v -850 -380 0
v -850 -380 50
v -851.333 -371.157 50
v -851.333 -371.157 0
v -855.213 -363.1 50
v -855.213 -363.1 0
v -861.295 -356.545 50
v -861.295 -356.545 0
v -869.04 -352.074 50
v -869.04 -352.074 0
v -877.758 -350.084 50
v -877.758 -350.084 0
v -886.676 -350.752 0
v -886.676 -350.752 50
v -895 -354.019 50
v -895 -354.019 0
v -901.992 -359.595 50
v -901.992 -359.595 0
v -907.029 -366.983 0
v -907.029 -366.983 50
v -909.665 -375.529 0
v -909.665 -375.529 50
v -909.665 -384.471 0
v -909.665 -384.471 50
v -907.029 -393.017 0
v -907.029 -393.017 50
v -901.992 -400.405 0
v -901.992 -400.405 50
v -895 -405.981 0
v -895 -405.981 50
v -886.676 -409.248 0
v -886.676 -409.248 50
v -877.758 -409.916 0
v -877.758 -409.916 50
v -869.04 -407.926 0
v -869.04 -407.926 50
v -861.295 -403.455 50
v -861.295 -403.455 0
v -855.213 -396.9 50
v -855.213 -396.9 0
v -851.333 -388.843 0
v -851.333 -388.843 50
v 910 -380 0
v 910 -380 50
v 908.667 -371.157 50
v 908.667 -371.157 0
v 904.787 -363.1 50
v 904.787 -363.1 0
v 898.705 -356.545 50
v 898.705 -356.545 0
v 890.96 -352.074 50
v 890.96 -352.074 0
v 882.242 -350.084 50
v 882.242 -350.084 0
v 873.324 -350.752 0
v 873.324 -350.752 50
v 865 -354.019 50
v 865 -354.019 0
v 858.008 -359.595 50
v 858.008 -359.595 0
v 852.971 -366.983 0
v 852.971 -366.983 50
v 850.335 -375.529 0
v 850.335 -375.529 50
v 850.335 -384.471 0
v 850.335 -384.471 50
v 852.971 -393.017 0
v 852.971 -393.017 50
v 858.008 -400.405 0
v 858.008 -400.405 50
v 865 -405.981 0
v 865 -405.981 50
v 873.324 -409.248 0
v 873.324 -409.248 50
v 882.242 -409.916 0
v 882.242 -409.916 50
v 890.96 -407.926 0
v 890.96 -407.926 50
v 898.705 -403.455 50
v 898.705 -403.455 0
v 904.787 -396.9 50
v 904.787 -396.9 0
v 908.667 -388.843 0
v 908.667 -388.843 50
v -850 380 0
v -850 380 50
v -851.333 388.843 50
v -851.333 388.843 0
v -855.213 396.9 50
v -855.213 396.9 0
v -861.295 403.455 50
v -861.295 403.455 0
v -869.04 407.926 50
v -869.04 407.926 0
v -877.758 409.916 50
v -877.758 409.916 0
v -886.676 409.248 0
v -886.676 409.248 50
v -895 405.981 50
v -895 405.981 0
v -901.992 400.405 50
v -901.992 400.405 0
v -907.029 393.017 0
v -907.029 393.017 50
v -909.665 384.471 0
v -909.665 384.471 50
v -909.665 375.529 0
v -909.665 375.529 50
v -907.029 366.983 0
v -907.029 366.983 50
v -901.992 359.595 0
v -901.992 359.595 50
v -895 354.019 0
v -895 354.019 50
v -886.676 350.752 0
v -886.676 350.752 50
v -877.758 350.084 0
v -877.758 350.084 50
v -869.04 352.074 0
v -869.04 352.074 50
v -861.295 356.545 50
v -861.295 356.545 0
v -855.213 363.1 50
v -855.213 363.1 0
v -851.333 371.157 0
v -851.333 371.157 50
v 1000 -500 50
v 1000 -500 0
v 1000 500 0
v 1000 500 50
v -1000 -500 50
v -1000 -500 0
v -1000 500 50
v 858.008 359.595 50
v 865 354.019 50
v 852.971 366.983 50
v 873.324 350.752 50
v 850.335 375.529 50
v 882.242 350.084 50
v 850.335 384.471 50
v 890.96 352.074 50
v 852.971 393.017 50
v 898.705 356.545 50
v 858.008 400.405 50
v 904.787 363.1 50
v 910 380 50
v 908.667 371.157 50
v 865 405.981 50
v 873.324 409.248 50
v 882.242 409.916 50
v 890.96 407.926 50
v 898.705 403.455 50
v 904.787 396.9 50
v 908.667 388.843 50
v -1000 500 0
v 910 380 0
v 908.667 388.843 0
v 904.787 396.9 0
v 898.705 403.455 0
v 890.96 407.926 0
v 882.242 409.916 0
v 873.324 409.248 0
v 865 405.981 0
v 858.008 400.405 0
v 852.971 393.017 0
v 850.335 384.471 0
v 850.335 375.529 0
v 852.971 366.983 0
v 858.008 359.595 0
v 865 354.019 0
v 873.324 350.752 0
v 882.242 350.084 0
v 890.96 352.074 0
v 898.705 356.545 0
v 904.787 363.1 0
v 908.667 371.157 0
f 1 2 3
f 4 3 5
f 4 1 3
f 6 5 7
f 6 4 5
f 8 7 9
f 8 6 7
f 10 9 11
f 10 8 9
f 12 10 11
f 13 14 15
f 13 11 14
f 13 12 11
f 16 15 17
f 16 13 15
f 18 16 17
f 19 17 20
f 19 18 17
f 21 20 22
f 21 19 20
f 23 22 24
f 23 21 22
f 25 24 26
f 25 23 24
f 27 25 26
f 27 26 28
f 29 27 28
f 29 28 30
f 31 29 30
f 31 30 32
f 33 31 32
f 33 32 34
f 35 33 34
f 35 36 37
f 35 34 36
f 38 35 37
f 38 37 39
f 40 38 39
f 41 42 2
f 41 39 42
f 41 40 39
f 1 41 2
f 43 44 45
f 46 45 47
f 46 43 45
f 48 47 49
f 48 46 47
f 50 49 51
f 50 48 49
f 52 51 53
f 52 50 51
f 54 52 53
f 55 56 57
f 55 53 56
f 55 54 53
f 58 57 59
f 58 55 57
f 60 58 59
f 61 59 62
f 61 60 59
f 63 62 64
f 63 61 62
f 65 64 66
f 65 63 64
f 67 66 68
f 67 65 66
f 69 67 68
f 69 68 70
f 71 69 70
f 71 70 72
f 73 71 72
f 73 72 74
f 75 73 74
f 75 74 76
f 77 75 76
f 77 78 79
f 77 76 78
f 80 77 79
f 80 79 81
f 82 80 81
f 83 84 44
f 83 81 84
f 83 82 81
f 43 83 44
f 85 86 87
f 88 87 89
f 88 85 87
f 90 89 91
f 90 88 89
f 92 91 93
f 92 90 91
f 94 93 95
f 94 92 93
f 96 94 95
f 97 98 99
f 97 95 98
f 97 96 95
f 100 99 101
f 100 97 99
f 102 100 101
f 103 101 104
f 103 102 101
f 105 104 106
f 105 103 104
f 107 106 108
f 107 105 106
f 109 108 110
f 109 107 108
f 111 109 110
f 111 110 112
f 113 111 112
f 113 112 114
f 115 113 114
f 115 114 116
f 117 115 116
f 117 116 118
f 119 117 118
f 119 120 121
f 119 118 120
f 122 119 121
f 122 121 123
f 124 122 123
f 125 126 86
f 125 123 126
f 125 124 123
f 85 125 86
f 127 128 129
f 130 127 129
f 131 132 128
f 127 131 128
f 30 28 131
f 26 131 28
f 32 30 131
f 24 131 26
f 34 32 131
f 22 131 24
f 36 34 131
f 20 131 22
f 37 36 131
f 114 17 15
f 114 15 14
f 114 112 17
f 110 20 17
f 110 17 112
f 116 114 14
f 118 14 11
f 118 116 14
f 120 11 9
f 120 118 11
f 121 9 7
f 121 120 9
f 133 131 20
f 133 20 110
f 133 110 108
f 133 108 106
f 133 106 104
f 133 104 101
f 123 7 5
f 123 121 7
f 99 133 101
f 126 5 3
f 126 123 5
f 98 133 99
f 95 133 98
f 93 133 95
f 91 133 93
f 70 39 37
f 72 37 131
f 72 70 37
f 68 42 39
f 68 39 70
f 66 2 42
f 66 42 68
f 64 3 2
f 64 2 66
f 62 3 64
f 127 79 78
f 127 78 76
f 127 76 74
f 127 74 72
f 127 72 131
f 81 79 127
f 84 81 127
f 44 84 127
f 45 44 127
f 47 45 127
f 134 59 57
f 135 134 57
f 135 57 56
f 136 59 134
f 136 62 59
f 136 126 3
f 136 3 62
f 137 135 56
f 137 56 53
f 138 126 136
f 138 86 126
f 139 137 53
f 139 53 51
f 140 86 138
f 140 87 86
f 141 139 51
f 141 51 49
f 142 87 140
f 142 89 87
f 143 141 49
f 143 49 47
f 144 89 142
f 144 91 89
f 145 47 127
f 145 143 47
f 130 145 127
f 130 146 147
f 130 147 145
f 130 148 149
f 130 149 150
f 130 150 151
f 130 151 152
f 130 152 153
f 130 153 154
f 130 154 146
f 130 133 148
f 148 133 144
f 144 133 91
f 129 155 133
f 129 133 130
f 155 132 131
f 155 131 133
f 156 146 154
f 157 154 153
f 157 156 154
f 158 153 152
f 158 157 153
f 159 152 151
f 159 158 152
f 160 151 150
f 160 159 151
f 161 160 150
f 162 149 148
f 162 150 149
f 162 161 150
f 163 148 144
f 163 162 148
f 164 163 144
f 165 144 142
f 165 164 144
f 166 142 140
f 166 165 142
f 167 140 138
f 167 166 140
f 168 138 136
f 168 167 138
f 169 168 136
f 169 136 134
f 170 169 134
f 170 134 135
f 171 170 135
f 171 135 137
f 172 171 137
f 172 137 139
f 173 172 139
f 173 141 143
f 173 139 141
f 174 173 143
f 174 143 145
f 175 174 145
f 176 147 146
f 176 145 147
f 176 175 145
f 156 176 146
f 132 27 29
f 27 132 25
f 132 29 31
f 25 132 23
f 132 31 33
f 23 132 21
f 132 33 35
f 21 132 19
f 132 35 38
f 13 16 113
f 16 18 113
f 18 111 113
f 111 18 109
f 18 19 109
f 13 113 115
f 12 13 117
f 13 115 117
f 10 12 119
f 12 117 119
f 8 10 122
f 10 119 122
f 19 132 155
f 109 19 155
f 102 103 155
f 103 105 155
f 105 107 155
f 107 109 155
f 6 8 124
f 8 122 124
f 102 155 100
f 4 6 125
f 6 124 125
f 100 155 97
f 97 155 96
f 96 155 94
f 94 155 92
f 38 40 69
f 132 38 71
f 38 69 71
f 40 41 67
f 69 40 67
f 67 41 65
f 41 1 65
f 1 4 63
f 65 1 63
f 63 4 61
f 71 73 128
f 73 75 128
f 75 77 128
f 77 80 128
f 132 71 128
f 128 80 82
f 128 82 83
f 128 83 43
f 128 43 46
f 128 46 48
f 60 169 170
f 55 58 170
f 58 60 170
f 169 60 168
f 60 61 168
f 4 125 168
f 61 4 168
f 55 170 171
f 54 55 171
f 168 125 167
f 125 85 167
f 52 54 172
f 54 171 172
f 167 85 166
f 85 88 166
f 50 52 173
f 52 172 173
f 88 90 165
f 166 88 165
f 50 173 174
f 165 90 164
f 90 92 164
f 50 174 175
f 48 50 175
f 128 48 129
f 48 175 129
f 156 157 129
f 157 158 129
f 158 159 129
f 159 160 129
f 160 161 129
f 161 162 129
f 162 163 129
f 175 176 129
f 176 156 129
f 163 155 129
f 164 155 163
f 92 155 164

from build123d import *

# Parameters (mm, degrees)
SKETCH_1_W          = 2000
SKETCH_1_H          = 1000
EXTRUDE_1_DEPTH     = 50
SKETCH_2_R          = 30
CUT_EXTRUDE_1_DEPTH = 1120.15146428
SKETCH_3_R          = 30
CUT_EXTRUDE_2_DEPTH = 1120.15146428
SKETCH_4_R          = 30
CUT_EXTRUDE_3_DEPTH = 1120.15146428
SKETCH_5_R          = 30
CUT_EXTRUDE_4_DEPTH = 1120.15146428


with BuildPart() as part:
    # 草图1 → 凸台-拉伸1 (new body)
    with BuildSketch(Plane.XY):
        Rectangle(SKETCH_1_W, SKETCH_1_H)
    extrude(amount=EXTRUDE_1_DEPTH)

    # 草图2 → 切除-拉伸1 (cut, through all)
    with BuildSketch(Plane.XY):
        with Locations((880, 380)):
            Circle(SKETCH_2_R)
    extrude(amount=CUT_EXTRUDE_1_DEPTH, mode=Mode.SUBTRACT)

    # 草图3 → 切除-拉伸2 (cut, through all)
    with BuildSketch(Plane.XY):
        with Locations((880, -380)):
            Circle(SKETCH_3_R)
    extrude(amount=CUT_EXTRUDE_2_DEPTH, mode=Mode.SUBTRACT)

    # 草图4 → 切除-拉伸3 (cut, through all)
    with BuildSketch(Plane.XY):
        with Locations((-880, 380)):
            Circle(SKETCH_4_R)
    extrude(amount=CUT_EXTRUDE_3_DEPTH, mode=Mode.SUBTRACT)

    # 草图5 → 切除-拉伸4 (cut, through all)
    with BuildSketch(Plane.XY):
        with Locations((-880, -380)):
            Circle(SKETCH_5_R)
    extrude(amount=CUT_EXTRUDE_4_DEPTH, mode=Mode.SUBTRACT)


solid = part.part
